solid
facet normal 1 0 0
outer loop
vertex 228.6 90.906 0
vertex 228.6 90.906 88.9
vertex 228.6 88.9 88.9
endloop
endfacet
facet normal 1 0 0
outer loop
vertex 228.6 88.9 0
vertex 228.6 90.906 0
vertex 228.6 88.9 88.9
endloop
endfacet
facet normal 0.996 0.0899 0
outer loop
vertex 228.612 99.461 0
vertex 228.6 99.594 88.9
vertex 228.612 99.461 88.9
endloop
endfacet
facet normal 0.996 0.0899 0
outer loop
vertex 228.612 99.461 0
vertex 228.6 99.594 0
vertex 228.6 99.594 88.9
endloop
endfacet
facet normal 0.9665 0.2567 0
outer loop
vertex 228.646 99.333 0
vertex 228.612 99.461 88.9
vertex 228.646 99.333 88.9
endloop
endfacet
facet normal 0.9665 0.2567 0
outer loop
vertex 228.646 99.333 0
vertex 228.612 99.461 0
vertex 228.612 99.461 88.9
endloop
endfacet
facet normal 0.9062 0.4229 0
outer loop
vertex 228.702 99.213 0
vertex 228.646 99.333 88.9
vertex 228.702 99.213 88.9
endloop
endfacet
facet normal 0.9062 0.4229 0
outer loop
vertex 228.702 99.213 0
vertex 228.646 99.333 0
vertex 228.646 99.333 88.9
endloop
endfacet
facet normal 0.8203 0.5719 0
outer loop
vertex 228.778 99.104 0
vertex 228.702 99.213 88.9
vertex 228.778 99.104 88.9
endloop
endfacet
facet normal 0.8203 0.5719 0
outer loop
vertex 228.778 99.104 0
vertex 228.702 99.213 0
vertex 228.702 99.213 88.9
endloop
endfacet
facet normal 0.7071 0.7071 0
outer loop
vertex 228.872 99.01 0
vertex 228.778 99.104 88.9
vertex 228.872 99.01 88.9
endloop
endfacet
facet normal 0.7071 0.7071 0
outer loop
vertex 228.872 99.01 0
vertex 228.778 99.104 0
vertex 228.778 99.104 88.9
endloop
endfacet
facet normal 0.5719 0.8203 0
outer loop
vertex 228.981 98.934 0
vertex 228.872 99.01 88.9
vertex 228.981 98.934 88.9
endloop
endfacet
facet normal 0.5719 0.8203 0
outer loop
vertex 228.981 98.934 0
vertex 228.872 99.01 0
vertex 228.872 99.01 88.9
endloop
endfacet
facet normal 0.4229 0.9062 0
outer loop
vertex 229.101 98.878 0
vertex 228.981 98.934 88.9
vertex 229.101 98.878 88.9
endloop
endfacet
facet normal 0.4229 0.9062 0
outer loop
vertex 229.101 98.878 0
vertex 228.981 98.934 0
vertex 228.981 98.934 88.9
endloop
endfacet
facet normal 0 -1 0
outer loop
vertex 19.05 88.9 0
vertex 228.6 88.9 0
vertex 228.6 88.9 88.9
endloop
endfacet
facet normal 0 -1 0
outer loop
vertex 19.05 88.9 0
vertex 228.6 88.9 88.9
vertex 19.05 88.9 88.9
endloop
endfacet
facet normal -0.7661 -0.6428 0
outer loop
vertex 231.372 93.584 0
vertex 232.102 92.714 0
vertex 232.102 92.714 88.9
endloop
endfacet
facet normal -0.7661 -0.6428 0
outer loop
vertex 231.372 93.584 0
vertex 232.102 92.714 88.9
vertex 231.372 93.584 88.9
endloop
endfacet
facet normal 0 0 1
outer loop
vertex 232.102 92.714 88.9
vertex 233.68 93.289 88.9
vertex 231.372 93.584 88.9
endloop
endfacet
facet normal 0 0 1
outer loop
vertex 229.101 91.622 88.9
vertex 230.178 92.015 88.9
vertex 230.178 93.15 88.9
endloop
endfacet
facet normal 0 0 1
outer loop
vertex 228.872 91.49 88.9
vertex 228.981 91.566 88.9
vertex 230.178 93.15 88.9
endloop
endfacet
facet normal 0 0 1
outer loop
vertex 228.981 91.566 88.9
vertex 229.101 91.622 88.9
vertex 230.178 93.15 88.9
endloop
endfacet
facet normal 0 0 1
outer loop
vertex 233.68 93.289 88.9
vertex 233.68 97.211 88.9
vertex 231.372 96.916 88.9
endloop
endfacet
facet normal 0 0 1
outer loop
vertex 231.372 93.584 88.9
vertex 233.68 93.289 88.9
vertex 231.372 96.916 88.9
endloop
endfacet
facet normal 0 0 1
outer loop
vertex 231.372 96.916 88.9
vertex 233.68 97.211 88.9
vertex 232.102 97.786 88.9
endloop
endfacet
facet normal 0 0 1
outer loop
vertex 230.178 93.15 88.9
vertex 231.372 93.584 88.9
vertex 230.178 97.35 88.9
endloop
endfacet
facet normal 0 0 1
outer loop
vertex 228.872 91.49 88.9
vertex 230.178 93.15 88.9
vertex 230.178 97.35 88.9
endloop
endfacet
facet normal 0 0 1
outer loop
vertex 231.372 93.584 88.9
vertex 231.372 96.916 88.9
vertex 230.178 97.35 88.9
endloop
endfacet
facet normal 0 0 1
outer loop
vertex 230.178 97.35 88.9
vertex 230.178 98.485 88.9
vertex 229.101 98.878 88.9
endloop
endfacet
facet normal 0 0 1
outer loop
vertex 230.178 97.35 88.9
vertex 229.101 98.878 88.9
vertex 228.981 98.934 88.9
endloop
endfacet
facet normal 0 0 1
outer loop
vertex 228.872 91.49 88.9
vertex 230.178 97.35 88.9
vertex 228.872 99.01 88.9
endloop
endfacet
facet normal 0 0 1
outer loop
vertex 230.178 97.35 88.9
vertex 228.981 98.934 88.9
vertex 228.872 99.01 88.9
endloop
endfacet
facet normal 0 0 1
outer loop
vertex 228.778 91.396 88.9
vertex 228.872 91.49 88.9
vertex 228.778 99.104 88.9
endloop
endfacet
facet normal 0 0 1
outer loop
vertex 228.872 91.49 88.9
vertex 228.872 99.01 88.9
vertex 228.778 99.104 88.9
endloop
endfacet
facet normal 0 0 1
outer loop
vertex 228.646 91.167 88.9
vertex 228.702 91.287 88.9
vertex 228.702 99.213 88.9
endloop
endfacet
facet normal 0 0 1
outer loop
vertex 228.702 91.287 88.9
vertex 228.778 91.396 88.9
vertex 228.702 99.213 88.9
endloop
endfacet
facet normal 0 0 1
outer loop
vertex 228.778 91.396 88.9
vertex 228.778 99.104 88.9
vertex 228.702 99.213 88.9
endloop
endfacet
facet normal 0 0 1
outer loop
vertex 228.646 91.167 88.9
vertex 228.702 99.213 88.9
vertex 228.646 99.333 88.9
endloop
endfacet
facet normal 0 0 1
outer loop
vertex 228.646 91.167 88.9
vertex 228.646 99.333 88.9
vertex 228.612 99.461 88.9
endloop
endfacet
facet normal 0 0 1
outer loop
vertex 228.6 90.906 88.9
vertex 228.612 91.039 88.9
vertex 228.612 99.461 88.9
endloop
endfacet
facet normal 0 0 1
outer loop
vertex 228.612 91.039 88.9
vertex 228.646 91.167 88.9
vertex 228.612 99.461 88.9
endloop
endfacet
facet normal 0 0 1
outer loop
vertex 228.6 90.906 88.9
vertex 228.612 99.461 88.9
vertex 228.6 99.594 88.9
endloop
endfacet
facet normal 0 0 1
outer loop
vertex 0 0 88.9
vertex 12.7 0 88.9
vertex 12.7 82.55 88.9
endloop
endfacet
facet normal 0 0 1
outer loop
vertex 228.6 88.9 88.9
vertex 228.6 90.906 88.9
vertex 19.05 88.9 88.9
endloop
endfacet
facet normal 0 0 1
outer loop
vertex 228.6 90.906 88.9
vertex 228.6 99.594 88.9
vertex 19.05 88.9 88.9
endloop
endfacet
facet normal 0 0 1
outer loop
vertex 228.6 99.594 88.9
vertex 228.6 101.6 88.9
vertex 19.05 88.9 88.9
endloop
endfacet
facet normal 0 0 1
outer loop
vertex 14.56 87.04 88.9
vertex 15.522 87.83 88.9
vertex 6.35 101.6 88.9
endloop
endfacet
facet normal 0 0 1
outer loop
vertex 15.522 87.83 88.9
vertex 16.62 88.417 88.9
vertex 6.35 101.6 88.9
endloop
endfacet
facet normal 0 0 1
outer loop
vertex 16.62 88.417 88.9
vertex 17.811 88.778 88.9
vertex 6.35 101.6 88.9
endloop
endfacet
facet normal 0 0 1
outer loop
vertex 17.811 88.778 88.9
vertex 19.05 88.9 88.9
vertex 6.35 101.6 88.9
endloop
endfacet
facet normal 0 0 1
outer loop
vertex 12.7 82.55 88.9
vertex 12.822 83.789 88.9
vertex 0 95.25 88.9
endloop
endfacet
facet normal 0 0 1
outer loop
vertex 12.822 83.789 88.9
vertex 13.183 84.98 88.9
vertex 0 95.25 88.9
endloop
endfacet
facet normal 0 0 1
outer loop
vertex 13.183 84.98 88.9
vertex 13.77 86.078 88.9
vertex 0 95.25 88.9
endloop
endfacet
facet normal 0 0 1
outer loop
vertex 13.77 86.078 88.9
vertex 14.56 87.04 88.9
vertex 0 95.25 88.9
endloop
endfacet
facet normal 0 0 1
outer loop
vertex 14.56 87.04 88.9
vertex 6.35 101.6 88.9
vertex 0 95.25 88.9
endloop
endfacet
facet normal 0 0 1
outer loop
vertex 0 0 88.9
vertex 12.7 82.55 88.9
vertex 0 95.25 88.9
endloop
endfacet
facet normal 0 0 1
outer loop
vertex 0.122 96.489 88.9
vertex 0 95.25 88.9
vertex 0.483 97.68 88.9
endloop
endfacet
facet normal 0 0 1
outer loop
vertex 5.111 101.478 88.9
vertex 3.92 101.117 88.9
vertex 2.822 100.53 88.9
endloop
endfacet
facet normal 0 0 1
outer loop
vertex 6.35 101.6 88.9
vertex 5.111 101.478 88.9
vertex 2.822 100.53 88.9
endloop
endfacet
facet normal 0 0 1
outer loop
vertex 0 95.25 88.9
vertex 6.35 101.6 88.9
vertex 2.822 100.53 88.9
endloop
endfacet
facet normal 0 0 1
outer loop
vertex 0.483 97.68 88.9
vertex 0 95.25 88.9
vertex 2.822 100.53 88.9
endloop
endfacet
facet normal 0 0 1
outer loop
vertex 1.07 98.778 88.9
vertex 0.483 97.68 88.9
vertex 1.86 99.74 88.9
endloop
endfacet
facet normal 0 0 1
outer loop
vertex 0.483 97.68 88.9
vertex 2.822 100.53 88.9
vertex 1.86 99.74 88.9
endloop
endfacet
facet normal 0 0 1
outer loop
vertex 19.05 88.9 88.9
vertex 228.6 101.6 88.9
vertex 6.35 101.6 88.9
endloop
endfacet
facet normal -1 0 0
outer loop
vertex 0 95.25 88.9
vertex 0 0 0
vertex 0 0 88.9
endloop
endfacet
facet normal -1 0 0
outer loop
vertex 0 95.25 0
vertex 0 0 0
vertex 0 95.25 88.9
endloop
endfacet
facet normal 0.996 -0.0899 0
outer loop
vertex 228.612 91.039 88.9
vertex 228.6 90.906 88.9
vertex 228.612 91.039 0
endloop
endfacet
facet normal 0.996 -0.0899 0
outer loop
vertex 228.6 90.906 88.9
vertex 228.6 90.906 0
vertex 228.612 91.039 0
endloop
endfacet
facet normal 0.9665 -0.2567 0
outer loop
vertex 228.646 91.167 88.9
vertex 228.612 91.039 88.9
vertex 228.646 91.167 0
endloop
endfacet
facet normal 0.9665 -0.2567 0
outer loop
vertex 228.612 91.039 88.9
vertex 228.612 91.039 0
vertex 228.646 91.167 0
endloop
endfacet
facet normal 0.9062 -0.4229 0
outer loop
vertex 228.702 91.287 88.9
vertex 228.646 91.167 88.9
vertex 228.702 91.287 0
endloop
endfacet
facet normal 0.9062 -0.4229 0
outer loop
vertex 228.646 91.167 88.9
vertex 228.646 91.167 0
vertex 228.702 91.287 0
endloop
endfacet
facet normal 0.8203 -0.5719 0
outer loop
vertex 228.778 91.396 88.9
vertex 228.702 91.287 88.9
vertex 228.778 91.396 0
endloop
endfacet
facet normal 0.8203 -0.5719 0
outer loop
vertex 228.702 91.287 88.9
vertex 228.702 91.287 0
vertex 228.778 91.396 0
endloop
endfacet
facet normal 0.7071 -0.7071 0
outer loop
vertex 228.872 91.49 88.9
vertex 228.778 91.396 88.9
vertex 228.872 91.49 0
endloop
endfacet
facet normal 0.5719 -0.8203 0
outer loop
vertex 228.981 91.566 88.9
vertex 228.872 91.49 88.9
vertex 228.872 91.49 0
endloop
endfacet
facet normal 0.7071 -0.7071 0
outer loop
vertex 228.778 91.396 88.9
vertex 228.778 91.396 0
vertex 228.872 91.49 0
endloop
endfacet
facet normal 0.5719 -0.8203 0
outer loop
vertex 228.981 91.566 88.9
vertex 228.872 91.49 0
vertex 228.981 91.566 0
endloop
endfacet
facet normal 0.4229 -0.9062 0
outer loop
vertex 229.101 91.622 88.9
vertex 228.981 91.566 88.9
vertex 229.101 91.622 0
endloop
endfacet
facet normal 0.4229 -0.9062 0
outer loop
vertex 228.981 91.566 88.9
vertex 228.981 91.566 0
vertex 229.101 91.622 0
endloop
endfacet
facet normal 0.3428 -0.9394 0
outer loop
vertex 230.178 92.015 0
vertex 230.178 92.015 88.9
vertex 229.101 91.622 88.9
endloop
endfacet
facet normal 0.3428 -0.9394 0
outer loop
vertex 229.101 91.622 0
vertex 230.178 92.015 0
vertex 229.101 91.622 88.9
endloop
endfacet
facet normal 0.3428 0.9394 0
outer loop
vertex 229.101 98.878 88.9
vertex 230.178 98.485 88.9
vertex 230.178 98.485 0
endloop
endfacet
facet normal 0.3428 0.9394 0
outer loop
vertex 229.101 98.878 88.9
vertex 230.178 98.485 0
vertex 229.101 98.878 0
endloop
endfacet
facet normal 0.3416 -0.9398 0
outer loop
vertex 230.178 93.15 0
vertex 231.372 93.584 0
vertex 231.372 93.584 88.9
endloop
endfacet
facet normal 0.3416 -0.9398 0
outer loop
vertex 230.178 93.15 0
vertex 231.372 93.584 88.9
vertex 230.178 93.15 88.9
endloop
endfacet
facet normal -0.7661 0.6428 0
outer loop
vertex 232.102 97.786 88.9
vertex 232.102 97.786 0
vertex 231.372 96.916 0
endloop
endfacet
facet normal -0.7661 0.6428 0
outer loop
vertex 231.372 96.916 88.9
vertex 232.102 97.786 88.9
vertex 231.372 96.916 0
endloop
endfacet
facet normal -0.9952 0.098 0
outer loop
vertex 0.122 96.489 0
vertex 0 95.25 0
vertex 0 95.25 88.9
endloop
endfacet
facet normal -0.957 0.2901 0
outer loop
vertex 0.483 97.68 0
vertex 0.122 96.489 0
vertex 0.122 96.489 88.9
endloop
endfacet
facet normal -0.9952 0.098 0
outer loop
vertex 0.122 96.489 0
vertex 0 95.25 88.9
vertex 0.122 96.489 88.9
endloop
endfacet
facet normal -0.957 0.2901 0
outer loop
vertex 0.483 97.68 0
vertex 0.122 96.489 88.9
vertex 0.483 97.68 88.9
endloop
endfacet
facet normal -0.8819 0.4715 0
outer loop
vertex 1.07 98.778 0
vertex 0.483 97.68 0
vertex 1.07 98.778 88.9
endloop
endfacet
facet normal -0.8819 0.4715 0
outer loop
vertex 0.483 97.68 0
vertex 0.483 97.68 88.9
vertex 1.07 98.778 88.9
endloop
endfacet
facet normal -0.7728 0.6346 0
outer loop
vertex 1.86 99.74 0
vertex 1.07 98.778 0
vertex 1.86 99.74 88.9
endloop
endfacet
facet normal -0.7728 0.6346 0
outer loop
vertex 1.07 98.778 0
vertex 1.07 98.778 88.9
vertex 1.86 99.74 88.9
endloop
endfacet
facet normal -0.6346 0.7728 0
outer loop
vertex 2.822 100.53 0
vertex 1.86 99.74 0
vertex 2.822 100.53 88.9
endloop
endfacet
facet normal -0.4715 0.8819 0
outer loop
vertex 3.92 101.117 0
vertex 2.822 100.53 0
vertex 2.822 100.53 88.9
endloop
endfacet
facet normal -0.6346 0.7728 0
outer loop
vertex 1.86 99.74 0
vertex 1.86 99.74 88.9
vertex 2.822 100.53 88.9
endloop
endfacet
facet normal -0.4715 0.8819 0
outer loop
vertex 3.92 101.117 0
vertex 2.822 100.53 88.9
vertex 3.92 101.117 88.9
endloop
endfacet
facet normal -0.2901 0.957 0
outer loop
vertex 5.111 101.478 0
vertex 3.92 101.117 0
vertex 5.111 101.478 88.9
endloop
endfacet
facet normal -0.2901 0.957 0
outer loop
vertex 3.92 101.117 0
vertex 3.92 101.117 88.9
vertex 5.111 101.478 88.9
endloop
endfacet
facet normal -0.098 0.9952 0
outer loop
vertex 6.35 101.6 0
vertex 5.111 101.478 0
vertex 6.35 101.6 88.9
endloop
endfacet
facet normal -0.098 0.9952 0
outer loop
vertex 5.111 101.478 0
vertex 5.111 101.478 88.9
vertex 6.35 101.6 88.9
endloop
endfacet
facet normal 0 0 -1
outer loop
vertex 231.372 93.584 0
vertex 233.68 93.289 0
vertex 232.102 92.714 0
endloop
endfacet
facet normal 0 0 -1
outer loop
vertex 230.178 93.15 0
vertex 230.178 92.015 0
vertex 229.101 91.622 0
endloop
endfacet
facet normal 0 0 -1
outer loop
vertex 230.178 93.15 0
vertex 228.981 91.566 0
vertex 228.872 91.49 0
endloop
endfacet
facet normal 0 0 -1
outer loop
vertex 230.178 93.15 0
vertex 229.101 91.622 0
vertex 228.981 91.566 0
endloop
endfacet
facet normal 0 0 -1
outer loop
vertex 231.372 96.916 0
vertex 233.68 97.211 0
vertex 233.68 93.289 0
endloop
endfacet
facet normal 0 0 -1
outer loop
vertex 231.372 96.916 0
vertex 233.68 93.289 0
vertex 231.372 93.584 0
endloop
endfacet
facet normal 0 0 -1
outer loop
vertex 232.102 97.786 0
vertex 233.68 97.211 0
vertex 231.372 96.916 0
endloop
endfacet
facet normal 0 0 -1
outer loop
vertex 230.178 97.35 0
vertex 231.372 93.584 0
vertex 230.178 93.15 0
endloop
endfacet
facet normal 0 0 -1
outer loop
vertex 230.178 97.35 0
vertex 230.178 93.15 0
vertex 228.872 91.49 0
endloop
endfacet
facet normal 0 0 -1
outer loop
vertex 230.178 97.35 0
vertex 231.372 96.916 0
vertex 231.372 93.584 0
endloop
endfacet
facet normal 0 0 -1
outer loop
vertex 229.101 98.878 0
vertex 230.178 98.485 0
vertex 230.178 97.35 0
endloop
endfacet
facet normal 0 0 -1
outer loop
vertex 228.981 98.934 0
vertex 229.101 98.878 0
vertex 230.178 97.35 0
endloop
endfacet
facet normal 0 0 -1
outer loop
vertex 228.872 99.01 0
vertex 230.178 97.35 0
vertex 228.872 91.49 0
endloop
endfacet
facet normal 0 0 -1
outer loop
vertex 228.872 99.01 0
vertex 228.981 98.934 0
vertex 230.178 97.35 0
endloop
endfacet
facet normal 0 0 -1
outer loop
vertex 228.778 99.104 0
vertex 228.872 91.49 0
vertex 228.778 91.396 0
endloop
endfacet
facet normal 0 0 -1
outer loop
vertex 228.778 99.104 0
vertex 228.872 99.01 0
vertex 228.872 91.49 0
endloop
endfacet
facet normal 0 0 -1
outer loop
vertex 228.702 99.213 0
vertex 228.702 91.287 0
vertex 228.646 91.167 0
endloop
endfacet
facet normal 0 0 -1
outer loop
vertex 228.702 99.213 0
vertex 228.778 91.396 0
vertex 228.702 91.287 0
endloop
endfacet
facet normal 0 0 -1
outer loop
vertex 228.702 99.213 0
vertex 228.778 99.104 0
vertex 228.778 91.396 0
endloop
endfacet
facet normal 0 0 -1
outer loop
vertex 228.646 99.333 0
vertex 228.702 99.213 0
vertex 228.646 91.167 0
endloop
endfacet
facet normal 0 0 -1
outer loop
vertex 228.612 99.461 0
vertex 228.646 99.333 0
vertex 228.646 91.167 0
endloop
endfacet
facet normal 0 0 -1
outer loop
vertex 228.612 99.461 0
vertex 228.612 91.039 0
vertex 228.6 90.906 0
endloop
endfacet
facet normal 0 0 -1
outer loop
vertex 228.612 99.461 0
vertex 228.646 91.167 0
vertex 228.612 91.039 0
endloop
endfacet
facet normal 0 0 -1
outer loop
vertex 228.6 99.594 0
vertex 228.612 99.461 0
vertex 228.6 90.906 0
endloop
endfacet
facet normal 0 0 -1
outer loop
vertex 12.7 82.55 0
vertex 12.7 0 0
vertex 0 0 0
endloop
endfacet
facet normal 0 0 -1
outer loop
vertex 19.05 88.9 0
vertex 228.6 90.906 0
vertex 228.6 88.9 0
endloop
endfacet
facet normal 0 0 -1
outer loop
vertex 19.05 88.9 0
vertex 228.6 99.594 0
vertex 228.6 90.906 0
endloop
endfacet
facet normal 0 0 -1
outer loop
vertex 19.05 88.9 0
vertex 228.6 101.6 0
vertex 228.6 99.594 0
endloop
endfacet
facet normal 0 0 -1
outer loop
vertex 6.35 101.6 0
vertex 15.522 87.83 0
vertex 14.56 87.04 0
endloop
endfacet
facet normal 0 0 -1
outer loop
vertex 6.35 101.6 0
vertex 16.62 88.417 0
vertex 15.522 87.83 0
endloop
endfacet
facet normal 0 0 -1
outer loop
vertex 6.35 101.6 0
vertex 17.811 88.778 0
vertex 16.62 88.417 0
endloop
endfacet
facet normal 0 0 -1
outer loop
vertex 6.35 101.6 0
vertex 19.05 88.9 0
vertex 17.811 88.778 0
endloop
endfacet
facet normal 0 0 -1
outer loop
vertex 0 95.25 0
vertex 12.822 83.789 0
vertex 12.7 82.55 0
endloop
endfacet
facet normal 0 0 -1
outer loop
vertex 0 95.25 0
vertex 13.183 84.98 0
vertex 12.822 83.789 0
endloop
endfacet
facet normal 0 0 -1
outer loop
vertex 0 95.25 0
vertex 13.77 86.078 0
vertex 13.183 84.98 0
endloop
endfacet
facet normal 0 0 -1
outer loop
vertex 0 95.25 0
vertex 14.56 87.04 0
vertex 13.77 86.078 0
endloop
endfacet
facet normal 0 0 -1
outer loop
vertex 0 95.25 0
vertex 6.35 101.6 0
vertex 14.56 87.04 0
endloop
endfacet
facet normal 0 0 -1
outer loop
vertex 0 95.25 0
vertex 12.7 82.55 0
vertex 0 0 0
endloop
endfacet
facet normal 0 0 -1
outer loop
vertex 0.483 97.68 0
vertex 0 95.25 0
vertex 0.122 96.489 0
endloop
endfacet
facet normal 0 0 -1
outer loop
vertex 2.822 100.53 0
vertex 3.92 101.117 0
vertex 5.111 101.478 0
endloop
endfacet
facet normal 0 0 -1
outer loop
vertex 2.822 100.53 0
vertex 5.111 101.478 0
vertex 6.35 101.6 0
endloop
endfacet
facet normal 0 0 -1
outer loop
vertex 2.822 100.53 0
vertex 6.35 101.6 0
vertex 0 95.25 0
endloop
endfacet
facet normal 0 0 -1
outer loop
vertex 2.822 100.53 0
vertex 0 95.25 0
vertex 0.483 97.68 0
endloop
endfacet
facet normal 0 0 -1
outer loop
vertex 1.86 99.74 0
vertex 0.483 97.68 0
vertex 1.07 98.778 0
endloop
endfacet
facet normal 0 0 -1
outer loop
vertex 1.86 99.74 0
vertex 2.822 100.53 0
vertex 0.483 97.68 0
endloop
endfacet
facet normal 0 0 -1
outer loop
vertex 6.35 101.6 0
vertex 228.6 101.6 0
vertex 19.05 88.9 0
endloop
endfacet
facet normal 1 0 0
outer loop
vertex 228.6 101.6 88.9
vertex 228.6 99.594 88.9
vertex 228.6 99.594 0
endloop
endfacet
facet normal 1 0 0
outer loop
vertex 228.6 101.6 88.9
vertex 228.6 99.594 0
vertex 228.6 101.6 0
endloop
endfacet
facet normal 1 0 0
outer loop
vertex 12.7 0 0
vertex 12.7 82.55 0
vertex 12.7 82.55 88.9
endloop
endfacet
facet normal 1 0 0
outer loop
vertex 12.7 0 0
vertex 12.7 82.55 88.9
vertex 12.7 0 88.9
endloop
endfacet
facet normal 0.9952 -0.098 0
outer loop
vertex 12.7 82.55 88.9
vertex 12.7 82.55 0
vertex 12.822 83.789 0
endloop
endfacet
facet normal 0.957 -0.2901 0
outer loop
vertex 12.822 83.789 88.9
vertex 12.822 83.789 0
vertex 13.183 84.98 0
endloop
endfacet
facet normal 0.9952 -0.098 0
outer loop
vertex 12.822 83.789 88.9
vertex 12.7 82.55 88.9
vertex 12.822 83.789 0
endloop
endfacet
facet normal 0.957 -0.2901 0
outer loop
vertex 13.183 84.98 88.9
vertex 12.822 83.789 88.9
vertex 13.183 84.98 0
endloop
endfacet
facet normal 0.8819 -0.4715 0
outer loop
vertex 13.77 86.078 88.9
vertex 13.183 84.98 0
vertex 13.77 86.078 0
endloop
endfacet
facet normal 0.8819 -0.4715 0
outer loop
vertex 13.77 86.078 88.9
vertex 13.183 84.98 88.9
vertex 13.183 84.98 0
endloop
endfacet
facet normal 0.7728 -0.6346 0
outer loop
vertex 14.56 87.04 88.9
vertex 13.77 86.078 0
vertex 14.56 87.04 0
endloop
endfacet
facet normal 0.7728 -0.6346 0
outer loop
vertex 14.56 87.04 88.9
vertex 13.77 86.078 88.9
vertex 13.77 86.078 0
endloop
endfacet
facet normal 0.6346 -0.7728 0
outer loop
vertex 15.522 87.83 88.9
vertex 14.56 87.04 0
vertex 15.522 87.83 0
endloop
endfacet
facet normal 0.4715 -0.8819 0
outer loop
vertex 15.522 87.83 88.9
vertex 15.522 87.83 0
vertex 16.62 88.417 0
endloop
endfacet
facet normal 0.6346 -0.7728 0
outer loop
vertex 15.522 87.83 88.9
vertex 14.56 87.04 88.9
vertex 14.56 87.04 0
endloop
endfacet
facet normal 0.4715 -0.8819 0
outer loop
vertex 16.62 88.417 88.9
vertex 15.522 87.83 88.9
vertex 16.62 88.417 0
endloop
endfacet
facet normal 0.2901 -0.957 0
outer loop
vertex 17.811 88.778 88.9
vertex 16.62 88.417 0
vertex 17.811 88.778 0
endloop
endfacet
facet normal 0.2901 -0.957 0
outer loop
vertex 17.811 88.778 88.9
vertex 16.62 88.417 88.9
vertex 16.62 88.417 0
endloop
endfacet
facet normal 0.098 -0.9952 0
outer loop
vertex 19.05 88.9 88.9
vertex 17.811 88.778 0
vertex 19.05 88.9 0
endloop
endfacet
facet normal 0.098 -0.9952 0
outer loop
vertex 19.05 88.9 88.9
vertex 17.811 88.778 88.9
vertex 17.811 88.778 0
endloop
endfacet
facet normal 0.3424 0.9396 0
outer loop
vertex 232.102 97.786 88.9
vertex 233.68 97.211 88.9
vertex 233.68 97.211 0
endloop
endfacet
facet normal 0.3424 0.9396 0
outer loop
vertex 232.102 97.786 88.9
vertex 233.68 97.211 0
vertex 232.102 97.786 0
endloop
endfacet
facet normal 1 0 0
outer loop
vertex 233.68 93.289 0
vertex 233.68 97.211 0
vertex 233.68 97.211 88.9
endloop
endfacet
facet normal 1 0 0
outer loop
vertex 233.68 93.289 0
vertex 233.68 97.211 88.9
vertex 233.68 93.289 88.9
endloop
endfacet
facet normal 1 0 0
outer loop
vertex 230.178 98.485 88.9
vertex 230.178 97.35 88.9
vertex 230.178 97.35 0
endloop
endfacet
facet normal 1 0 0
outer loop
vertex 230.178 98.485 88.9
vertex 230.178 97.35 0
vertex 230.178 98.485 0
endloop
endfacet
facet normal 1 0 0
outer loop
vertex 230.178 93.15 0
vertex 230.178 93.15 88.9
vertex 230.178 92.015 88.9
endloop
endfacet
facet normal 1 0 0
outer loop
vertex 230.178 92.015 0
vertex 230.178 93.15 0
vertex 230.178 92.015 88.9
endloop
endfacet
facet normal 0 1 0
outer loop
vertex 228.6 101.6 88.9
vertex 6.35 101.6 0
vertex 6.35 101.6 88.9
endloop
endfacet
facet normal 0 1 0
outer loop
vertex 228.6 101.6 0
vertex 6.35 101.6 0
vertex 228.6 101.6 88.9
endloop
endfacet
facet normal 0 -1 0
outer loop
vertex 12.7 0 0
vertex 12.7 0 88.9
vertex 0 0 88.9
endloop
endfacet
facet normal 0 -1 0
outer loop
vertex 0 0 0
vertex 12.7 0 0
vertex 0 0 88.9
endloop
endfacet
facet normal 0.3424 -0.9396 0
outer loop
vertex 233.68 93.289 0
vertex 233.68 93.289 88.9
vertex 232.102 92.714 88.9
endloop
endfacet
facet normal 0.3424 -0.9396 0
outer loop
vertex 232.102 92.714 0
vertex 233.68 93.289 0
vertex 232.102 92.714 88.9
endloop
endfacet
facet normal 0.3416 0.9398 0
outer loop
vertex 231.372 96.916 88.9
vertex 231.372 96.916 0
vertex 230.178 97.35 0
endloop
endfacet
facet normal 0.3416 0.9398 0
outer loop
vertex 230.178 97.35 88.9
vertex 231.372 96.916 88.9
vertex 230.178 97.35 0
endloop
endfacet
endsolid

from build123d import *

# Parameters (mm, degrees)
BOSS_EXTRUDE2_DEPTH = 88.9
CUT_EXTRUDE3_DEPTH  = 89.9
FILLET2_R           = 6.35
FILLET4_R           = 0.762


with BuildPart() as part:
    # Sketch1 → Boss-Extrude2 (new body)
    with BuildSketch(Plane.XY):
        Polygon((0, 0), (0, 101.6), (233.68, 101.6), (233.68, 88.9), (12.7, 88.9), (12.7, 0), align=None)
    extrude(amount=BOSS_EXTRUDE2_DEPTH)

    # Sketch8 → Cut-Extrude3 (cut, through all)
    with BuildSketch(Plane.XY.offset(88.9)):
        Polygon((228.6, 101.6), (233.68, 101.6), (233.68, 97.21103121), (232.101530561, 97.785547072), (231.371879071, 96.91598223), (230.178469436, 97.350347792), (230.178469436, 98.485484045), (228.6, 99.059999906), align=None)
        Polygon((228.6, 88.9), (233.68, 88.9), (233.68, 93.28896879), (232.101530561, 92.714452928), (231.371879071, 93.58401777), (230.178469436, 93.149652208), (230.178469436, 92.014515955), (228.6, 91.440000094), align=None)
    extrude(amount=-CUT_EXTRUDE3_DEPTH, mode=Mode.SUBTRACT)

    # Fillet2
    fillet2_edges = [part.edges().sort_by_distance(p)[0] for p in [
        (0, 101.6, 44.45),
        (12.7, 88.9, 44.45),
    ]]
    fillet(fillet2_edges, radius=FILLET2_R)

    # Fillet4
    fillet4_edges = [part.edges().sort_by_distance(p)[0] for p in [
        (228.6, 91.440000094, 44.45),
        (228.6, 99.059999906, 44.45),
    ]]
    fillet(fillet4_edges, radius=FILLET4_R)


solid = part.part
